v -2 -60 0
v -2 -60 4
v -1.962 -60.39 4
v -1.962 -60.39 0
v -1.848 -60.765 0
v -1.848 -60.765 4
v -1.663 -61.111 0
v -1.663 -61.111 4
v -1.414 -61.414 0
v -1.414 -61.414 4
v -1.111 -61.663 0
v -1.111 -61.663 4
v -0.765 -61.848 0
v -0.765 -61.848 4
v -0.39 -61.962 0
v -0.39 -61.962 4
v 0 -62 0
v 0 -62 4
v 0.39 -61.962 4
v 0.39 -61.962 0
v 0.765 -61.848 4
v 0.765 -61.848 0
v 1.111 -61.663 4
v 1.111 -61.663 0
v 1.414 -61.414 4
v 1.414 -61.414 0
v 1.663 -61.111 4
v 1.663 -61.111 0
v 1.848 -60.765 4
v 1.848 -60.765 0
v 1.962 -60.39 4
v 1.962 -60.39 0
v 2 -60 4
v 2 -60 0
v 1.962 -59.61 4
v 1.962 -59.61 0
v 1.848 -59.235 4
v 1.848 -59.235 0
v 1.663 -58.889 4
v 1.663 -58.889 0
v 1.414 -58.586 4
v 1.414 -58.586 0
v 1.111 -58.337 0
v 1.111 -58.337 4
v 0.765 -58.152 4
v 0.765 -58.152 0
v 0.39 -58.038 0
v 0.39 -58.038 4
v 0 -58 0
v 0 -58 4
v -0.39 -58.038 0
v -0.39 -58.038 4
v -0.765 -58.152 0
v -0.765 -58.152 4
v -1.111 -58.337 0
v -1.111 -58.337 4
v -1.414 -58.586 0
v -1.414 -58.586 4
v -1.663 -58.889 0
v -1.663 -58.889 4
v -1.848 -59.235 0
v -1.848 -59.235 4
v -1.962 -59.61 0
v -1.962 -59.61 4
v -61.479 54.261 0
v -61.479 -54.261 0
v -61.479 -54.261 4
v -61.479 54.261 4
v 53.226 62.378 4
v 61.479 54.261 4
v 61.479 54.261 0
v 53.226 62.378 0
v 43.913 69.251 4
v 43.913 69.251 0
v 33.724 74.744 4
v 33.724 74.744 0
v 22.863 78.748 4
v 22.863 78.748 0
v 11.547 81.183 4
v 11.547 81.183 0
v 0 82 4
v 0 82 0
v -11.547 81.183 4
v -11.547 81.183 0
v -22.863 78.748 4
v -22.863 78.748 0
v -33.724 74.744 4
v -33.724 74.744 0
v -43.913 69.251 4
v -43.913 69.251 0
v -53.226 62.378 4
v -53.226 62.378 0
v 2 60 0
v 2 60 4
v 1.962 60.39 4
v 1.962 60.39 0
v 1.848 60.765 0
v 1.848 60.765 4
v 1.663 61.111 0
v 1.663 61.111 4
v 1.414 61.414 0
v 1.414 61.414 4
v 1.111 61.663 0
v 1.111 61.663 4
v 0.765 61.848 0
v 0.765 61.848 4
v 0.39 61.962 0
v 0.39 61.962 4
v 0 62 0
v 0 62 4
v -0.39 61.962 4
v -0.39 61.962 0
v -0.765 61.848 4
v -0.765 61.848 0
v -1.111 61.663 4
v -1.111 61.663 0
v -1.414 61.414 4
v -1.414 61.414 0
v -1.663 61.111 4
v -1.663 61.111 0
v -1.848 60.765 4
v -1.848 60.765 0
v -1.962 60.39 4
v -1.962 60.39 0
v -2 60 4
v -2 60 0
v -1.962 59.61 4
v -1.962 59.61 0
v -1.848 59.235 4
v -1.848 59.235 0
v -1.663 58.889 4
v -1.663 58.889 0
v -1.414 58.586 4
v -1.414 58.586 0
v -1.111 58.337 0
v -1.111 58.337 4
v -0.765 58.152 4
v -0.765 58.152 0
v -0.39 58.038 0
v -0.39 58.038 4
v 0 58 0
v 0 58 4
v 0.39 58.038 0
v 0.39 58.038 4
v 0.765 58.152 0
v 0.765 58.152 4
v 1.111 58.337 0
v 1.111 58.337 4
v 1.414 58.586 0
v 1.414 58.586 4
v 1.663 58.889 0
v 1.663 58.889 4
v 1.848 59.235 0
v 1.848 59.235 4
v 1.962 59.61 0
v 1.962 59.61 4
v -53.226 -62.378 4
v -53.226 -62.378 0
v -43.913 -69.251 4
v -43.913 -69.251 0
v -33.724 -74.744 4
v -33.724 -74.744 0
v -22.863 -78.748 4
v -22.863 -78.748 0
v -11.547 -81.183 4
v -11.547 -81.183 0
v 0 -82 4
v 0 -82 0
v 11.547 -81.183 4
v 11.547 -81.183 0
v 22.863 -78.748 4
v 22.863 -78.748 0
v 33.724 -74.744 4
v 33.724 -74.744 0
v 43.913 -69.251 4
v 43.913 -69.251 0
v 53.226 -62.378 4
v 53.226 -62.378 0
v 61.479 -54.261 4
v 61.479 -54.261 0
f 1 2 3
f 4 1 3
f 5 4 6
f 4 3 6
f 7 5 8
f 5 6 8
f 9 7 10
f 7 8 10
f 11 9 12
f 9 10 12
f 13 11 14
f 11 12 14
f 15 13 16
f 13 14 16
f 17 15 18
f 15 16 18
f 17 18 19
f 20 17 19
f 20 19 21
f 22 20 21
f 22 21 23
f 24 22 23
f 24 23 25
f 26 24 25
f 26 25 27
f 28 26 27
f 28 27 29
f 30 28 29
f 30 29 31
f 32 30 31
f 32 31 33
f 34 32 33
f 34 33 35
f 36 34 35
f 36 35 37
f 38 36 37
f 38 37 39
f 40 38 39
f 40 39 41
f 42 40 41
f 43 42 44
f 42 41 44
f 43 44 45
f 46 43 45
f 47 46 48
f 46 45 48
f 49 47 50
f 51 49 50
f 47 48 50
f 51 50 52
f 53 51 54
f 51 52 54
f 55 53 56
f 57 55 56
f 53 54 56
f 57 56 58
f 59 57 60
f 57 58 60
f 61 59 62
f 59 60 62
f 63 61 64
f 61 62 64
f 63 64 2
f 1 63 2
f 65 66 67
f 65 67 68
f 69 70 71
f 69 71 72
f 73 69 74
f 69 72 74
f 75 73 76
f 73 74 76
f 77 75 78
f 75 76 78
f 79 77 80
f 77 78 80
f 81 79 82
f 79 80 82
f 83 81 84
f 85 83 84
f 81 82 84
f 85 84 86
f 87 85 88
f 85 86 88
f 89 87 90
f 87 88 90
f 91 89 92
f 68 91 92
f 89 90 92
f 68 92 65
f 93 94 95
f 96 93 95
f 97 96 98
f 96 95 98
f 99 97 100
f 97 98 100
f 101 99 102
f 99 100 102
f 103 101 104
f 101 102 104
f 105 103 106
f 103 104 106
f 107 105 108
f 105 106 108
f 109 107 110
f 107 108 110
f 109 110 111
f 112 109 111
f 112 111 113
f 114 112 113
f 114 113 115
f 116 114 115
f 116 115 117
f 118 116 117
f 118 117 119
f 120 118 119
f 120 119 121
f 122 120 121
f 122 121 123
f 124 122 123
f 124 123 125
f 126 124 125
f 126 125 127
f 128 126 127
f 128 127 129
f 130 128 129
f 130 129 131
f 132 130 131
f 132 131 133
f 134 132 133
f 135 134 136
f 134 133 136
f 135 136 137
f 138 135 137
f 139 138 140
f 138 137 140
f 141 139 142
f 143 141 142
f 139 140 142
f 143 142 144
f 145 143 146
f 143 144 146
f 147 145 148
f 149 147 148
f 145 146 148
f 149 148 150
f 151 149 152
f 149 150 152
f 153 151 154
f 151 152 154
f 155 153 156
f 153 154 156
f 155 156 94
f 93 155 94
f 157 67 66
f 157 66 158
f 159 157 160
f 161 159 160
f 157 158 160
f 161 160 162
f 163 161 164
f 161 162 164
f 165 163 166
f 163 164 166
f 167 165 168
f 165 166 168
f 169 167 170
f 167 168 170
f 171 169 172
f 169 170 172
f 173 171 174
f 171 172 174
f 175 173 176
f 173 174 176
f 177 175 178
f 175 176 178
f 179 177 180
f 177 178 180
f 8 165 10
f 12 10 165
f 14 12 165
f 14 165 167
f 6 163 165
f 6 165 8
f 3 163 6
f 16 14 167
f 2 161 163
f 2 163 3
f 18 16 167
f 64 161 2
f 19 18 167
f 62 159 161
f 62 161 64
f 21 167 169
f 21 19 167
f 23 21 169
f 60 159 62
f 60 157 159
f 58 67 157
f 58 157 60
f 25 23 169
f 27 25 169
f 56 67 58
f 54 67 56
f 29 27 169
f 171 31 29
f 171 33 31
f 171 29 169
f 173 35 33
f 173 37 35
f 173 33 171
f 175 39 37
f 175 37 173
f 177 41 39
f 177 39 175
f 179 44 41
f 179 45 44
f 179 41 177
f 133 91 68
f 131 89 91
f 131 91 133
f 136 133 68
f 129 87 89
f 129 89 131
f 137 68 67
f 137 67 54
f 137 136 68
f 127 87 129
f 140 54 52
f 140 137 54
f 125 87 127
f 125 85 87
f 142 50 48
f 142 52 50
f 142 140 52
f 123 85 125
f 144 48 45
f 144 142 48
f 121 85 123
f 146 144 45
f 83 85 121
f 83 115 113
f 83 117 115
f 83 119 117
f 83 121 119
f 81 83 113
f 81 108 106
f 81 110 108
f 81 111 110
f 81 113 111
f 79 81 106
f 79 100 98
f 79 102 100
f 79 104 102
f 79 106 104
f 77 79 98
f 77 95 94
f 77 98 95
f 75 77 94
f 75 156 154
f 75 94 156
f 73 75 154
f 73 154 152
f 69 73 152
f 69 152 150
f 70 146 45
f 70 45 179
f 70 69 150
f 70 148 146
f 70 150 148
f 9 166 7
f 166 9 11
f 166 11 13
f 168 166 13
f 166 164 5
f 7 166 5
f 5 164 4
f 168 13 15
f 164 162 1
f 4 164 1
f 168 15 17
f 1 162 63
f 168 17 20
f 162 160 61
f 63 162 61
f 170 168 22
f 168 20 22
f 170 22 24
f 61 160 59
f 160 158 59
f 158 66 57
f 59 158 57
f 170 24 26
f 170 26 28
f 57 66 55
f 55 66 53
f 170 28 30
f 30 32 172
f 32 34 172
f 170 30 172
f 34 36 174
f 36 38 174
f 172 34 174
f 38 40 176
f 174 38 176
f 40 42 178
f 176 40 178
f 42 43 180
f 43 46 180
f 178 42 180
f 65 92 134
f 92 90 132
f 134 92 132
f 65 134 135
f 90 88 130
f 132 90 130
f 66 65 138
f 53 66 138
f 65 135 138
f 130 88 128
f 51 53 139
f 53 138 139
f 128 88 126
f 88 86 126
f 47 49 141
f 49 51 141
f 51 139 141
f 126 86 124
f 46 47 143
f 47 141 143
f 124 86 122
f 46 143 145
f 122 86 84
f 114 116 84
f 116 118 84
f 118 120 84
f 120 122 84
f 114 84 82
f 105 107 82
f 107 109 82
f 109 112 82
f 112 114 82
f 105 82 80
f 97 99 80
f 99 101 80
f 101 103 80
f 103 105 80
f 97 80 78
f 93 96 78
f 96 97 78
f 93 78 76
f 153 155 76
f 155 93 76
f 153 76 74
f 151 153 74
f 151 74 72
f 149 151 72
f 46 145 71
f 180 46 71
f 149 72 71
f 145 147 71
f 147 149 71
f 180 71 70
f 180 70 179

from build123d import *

# Parameters (mm, degrees)
SKETCH1_R               = 82
BOSS_EXTRUDE1_DEPTH     = 4
SKETCH2_R               = 2
CUT_EXTRUDE1_DEPTH      = 8
CIRPATTERN1_COUNT       = 2
CUT_EXTRUDE2_DEPTH      = 117.034477635
CUT_EXTRUDE2_DEPTH_BACK = 10


with BuildPart() as part:
    # Sketch1 → Boss-Extrude1 (new body)
    with BuildSketch(Plane.XY):
        Circle(SKETCH1_R)
    extrude(amount=BOSS_EXTRUDE1_DEPTH)

    # Sketch2 → Cut-Extrude1 (cut)
    with BuildSketch(Plane.XY.offset(4)):
        with Locations((0, 60)):
            Circle(SKETCH2_R)
    cut_extrude1 = extrude(amount=-CUT_EXTRUDE1_DEPTH, mode=Mode.SUBTRACT)

    # CirPattern1: Cut-Extrude1 ×2 about axis
    cirpattern1_axis = Axis((0, 0, 0), (0, 0, 1))
    for i in range(1, CIRPATTERN1_COUNT):
        add(cut_extrude1.rotate(cirpattern1_axis, i * 360 / CIRPATTERN1_COUNT), mode=Mode.SUBTRACT)

    # Sketch3 → Cut-Extrude2 (cut, two sides: drawn at the far end of the back side and taken through both)
    with BuildSketch(Plane.XY.offset(4).offset(-CUT_EXTRUDE2_DEPTH_BACK)):
        with BuildLine():
            ThreePointArc((-61.479450169, 54.261194301), (-82, 0), (-61.479450169, -54.261194301))
            Line((-61.479450169, -54.261194301), (-61.479450169, 54.261194301))
        make_face()
        with BuildLine():
            Line((61.479450169, 54.261194301), (61.479450169, 31.325344482))
            ThreePointArc((61.479450169, 31.325344482), (67.093524507, 16.107730106), (69, 0))
            Line((69, 0), (82, 0))
            ThreePointArc((82, 0), (76.698484059, 29.005905314), (61.479450169, 54.261194301))
        make_face()
        with BuildLine():
            Line((61.479450169, 0), (61.479450169, -31.325344482))
            ThreePointArc((61.479450169, -31.325344482), (67.093524507, -16.107730106), (69, 0))
            Line((69, 0), (61.479450169, 0))
        make_face()
        with BuildLine():
            ThreePointArc((69, 0), (67.093524507, 16.107730106), (61.479450169, 31.325344482))
            Line((61.479450169, 31.325344482), (61.479450169, 0))
            Line((61.479450169, 0), (69, 0))
        make_face()
        with BuildLine():
            ThreePointArc((69, 0), (67.093524507, -16.107730106), (61.479450169, -31.325344482))
            Line((61.479450169, -31.325344482), (73.062534983, -37.227220979))
            ThreePointArc((73.062534983, -37.227220979), (79.734333473, -19.142519836), (82, 0))
            Line((82, 0), (69, 0))
        make_face()
        with BuildLine():
            Line((73.062534983, -37.227220979), (61.479450169, -31.325344482))
            Line((61.479450169, -31.325344482), (61.479450169, -54.261194301))
            ThreePointArc((61.479450169, -54.261194301), (67.808004719, -46.109375359), (73.062534983, -37.227220979))
        make_face()
    extrude(amount=CUT_EXTRUDE2_DEPTH + CUT_EXTRUDE2_DEPTH_BACK, mode=Mode.SUBTRACT)


solid = part.part
